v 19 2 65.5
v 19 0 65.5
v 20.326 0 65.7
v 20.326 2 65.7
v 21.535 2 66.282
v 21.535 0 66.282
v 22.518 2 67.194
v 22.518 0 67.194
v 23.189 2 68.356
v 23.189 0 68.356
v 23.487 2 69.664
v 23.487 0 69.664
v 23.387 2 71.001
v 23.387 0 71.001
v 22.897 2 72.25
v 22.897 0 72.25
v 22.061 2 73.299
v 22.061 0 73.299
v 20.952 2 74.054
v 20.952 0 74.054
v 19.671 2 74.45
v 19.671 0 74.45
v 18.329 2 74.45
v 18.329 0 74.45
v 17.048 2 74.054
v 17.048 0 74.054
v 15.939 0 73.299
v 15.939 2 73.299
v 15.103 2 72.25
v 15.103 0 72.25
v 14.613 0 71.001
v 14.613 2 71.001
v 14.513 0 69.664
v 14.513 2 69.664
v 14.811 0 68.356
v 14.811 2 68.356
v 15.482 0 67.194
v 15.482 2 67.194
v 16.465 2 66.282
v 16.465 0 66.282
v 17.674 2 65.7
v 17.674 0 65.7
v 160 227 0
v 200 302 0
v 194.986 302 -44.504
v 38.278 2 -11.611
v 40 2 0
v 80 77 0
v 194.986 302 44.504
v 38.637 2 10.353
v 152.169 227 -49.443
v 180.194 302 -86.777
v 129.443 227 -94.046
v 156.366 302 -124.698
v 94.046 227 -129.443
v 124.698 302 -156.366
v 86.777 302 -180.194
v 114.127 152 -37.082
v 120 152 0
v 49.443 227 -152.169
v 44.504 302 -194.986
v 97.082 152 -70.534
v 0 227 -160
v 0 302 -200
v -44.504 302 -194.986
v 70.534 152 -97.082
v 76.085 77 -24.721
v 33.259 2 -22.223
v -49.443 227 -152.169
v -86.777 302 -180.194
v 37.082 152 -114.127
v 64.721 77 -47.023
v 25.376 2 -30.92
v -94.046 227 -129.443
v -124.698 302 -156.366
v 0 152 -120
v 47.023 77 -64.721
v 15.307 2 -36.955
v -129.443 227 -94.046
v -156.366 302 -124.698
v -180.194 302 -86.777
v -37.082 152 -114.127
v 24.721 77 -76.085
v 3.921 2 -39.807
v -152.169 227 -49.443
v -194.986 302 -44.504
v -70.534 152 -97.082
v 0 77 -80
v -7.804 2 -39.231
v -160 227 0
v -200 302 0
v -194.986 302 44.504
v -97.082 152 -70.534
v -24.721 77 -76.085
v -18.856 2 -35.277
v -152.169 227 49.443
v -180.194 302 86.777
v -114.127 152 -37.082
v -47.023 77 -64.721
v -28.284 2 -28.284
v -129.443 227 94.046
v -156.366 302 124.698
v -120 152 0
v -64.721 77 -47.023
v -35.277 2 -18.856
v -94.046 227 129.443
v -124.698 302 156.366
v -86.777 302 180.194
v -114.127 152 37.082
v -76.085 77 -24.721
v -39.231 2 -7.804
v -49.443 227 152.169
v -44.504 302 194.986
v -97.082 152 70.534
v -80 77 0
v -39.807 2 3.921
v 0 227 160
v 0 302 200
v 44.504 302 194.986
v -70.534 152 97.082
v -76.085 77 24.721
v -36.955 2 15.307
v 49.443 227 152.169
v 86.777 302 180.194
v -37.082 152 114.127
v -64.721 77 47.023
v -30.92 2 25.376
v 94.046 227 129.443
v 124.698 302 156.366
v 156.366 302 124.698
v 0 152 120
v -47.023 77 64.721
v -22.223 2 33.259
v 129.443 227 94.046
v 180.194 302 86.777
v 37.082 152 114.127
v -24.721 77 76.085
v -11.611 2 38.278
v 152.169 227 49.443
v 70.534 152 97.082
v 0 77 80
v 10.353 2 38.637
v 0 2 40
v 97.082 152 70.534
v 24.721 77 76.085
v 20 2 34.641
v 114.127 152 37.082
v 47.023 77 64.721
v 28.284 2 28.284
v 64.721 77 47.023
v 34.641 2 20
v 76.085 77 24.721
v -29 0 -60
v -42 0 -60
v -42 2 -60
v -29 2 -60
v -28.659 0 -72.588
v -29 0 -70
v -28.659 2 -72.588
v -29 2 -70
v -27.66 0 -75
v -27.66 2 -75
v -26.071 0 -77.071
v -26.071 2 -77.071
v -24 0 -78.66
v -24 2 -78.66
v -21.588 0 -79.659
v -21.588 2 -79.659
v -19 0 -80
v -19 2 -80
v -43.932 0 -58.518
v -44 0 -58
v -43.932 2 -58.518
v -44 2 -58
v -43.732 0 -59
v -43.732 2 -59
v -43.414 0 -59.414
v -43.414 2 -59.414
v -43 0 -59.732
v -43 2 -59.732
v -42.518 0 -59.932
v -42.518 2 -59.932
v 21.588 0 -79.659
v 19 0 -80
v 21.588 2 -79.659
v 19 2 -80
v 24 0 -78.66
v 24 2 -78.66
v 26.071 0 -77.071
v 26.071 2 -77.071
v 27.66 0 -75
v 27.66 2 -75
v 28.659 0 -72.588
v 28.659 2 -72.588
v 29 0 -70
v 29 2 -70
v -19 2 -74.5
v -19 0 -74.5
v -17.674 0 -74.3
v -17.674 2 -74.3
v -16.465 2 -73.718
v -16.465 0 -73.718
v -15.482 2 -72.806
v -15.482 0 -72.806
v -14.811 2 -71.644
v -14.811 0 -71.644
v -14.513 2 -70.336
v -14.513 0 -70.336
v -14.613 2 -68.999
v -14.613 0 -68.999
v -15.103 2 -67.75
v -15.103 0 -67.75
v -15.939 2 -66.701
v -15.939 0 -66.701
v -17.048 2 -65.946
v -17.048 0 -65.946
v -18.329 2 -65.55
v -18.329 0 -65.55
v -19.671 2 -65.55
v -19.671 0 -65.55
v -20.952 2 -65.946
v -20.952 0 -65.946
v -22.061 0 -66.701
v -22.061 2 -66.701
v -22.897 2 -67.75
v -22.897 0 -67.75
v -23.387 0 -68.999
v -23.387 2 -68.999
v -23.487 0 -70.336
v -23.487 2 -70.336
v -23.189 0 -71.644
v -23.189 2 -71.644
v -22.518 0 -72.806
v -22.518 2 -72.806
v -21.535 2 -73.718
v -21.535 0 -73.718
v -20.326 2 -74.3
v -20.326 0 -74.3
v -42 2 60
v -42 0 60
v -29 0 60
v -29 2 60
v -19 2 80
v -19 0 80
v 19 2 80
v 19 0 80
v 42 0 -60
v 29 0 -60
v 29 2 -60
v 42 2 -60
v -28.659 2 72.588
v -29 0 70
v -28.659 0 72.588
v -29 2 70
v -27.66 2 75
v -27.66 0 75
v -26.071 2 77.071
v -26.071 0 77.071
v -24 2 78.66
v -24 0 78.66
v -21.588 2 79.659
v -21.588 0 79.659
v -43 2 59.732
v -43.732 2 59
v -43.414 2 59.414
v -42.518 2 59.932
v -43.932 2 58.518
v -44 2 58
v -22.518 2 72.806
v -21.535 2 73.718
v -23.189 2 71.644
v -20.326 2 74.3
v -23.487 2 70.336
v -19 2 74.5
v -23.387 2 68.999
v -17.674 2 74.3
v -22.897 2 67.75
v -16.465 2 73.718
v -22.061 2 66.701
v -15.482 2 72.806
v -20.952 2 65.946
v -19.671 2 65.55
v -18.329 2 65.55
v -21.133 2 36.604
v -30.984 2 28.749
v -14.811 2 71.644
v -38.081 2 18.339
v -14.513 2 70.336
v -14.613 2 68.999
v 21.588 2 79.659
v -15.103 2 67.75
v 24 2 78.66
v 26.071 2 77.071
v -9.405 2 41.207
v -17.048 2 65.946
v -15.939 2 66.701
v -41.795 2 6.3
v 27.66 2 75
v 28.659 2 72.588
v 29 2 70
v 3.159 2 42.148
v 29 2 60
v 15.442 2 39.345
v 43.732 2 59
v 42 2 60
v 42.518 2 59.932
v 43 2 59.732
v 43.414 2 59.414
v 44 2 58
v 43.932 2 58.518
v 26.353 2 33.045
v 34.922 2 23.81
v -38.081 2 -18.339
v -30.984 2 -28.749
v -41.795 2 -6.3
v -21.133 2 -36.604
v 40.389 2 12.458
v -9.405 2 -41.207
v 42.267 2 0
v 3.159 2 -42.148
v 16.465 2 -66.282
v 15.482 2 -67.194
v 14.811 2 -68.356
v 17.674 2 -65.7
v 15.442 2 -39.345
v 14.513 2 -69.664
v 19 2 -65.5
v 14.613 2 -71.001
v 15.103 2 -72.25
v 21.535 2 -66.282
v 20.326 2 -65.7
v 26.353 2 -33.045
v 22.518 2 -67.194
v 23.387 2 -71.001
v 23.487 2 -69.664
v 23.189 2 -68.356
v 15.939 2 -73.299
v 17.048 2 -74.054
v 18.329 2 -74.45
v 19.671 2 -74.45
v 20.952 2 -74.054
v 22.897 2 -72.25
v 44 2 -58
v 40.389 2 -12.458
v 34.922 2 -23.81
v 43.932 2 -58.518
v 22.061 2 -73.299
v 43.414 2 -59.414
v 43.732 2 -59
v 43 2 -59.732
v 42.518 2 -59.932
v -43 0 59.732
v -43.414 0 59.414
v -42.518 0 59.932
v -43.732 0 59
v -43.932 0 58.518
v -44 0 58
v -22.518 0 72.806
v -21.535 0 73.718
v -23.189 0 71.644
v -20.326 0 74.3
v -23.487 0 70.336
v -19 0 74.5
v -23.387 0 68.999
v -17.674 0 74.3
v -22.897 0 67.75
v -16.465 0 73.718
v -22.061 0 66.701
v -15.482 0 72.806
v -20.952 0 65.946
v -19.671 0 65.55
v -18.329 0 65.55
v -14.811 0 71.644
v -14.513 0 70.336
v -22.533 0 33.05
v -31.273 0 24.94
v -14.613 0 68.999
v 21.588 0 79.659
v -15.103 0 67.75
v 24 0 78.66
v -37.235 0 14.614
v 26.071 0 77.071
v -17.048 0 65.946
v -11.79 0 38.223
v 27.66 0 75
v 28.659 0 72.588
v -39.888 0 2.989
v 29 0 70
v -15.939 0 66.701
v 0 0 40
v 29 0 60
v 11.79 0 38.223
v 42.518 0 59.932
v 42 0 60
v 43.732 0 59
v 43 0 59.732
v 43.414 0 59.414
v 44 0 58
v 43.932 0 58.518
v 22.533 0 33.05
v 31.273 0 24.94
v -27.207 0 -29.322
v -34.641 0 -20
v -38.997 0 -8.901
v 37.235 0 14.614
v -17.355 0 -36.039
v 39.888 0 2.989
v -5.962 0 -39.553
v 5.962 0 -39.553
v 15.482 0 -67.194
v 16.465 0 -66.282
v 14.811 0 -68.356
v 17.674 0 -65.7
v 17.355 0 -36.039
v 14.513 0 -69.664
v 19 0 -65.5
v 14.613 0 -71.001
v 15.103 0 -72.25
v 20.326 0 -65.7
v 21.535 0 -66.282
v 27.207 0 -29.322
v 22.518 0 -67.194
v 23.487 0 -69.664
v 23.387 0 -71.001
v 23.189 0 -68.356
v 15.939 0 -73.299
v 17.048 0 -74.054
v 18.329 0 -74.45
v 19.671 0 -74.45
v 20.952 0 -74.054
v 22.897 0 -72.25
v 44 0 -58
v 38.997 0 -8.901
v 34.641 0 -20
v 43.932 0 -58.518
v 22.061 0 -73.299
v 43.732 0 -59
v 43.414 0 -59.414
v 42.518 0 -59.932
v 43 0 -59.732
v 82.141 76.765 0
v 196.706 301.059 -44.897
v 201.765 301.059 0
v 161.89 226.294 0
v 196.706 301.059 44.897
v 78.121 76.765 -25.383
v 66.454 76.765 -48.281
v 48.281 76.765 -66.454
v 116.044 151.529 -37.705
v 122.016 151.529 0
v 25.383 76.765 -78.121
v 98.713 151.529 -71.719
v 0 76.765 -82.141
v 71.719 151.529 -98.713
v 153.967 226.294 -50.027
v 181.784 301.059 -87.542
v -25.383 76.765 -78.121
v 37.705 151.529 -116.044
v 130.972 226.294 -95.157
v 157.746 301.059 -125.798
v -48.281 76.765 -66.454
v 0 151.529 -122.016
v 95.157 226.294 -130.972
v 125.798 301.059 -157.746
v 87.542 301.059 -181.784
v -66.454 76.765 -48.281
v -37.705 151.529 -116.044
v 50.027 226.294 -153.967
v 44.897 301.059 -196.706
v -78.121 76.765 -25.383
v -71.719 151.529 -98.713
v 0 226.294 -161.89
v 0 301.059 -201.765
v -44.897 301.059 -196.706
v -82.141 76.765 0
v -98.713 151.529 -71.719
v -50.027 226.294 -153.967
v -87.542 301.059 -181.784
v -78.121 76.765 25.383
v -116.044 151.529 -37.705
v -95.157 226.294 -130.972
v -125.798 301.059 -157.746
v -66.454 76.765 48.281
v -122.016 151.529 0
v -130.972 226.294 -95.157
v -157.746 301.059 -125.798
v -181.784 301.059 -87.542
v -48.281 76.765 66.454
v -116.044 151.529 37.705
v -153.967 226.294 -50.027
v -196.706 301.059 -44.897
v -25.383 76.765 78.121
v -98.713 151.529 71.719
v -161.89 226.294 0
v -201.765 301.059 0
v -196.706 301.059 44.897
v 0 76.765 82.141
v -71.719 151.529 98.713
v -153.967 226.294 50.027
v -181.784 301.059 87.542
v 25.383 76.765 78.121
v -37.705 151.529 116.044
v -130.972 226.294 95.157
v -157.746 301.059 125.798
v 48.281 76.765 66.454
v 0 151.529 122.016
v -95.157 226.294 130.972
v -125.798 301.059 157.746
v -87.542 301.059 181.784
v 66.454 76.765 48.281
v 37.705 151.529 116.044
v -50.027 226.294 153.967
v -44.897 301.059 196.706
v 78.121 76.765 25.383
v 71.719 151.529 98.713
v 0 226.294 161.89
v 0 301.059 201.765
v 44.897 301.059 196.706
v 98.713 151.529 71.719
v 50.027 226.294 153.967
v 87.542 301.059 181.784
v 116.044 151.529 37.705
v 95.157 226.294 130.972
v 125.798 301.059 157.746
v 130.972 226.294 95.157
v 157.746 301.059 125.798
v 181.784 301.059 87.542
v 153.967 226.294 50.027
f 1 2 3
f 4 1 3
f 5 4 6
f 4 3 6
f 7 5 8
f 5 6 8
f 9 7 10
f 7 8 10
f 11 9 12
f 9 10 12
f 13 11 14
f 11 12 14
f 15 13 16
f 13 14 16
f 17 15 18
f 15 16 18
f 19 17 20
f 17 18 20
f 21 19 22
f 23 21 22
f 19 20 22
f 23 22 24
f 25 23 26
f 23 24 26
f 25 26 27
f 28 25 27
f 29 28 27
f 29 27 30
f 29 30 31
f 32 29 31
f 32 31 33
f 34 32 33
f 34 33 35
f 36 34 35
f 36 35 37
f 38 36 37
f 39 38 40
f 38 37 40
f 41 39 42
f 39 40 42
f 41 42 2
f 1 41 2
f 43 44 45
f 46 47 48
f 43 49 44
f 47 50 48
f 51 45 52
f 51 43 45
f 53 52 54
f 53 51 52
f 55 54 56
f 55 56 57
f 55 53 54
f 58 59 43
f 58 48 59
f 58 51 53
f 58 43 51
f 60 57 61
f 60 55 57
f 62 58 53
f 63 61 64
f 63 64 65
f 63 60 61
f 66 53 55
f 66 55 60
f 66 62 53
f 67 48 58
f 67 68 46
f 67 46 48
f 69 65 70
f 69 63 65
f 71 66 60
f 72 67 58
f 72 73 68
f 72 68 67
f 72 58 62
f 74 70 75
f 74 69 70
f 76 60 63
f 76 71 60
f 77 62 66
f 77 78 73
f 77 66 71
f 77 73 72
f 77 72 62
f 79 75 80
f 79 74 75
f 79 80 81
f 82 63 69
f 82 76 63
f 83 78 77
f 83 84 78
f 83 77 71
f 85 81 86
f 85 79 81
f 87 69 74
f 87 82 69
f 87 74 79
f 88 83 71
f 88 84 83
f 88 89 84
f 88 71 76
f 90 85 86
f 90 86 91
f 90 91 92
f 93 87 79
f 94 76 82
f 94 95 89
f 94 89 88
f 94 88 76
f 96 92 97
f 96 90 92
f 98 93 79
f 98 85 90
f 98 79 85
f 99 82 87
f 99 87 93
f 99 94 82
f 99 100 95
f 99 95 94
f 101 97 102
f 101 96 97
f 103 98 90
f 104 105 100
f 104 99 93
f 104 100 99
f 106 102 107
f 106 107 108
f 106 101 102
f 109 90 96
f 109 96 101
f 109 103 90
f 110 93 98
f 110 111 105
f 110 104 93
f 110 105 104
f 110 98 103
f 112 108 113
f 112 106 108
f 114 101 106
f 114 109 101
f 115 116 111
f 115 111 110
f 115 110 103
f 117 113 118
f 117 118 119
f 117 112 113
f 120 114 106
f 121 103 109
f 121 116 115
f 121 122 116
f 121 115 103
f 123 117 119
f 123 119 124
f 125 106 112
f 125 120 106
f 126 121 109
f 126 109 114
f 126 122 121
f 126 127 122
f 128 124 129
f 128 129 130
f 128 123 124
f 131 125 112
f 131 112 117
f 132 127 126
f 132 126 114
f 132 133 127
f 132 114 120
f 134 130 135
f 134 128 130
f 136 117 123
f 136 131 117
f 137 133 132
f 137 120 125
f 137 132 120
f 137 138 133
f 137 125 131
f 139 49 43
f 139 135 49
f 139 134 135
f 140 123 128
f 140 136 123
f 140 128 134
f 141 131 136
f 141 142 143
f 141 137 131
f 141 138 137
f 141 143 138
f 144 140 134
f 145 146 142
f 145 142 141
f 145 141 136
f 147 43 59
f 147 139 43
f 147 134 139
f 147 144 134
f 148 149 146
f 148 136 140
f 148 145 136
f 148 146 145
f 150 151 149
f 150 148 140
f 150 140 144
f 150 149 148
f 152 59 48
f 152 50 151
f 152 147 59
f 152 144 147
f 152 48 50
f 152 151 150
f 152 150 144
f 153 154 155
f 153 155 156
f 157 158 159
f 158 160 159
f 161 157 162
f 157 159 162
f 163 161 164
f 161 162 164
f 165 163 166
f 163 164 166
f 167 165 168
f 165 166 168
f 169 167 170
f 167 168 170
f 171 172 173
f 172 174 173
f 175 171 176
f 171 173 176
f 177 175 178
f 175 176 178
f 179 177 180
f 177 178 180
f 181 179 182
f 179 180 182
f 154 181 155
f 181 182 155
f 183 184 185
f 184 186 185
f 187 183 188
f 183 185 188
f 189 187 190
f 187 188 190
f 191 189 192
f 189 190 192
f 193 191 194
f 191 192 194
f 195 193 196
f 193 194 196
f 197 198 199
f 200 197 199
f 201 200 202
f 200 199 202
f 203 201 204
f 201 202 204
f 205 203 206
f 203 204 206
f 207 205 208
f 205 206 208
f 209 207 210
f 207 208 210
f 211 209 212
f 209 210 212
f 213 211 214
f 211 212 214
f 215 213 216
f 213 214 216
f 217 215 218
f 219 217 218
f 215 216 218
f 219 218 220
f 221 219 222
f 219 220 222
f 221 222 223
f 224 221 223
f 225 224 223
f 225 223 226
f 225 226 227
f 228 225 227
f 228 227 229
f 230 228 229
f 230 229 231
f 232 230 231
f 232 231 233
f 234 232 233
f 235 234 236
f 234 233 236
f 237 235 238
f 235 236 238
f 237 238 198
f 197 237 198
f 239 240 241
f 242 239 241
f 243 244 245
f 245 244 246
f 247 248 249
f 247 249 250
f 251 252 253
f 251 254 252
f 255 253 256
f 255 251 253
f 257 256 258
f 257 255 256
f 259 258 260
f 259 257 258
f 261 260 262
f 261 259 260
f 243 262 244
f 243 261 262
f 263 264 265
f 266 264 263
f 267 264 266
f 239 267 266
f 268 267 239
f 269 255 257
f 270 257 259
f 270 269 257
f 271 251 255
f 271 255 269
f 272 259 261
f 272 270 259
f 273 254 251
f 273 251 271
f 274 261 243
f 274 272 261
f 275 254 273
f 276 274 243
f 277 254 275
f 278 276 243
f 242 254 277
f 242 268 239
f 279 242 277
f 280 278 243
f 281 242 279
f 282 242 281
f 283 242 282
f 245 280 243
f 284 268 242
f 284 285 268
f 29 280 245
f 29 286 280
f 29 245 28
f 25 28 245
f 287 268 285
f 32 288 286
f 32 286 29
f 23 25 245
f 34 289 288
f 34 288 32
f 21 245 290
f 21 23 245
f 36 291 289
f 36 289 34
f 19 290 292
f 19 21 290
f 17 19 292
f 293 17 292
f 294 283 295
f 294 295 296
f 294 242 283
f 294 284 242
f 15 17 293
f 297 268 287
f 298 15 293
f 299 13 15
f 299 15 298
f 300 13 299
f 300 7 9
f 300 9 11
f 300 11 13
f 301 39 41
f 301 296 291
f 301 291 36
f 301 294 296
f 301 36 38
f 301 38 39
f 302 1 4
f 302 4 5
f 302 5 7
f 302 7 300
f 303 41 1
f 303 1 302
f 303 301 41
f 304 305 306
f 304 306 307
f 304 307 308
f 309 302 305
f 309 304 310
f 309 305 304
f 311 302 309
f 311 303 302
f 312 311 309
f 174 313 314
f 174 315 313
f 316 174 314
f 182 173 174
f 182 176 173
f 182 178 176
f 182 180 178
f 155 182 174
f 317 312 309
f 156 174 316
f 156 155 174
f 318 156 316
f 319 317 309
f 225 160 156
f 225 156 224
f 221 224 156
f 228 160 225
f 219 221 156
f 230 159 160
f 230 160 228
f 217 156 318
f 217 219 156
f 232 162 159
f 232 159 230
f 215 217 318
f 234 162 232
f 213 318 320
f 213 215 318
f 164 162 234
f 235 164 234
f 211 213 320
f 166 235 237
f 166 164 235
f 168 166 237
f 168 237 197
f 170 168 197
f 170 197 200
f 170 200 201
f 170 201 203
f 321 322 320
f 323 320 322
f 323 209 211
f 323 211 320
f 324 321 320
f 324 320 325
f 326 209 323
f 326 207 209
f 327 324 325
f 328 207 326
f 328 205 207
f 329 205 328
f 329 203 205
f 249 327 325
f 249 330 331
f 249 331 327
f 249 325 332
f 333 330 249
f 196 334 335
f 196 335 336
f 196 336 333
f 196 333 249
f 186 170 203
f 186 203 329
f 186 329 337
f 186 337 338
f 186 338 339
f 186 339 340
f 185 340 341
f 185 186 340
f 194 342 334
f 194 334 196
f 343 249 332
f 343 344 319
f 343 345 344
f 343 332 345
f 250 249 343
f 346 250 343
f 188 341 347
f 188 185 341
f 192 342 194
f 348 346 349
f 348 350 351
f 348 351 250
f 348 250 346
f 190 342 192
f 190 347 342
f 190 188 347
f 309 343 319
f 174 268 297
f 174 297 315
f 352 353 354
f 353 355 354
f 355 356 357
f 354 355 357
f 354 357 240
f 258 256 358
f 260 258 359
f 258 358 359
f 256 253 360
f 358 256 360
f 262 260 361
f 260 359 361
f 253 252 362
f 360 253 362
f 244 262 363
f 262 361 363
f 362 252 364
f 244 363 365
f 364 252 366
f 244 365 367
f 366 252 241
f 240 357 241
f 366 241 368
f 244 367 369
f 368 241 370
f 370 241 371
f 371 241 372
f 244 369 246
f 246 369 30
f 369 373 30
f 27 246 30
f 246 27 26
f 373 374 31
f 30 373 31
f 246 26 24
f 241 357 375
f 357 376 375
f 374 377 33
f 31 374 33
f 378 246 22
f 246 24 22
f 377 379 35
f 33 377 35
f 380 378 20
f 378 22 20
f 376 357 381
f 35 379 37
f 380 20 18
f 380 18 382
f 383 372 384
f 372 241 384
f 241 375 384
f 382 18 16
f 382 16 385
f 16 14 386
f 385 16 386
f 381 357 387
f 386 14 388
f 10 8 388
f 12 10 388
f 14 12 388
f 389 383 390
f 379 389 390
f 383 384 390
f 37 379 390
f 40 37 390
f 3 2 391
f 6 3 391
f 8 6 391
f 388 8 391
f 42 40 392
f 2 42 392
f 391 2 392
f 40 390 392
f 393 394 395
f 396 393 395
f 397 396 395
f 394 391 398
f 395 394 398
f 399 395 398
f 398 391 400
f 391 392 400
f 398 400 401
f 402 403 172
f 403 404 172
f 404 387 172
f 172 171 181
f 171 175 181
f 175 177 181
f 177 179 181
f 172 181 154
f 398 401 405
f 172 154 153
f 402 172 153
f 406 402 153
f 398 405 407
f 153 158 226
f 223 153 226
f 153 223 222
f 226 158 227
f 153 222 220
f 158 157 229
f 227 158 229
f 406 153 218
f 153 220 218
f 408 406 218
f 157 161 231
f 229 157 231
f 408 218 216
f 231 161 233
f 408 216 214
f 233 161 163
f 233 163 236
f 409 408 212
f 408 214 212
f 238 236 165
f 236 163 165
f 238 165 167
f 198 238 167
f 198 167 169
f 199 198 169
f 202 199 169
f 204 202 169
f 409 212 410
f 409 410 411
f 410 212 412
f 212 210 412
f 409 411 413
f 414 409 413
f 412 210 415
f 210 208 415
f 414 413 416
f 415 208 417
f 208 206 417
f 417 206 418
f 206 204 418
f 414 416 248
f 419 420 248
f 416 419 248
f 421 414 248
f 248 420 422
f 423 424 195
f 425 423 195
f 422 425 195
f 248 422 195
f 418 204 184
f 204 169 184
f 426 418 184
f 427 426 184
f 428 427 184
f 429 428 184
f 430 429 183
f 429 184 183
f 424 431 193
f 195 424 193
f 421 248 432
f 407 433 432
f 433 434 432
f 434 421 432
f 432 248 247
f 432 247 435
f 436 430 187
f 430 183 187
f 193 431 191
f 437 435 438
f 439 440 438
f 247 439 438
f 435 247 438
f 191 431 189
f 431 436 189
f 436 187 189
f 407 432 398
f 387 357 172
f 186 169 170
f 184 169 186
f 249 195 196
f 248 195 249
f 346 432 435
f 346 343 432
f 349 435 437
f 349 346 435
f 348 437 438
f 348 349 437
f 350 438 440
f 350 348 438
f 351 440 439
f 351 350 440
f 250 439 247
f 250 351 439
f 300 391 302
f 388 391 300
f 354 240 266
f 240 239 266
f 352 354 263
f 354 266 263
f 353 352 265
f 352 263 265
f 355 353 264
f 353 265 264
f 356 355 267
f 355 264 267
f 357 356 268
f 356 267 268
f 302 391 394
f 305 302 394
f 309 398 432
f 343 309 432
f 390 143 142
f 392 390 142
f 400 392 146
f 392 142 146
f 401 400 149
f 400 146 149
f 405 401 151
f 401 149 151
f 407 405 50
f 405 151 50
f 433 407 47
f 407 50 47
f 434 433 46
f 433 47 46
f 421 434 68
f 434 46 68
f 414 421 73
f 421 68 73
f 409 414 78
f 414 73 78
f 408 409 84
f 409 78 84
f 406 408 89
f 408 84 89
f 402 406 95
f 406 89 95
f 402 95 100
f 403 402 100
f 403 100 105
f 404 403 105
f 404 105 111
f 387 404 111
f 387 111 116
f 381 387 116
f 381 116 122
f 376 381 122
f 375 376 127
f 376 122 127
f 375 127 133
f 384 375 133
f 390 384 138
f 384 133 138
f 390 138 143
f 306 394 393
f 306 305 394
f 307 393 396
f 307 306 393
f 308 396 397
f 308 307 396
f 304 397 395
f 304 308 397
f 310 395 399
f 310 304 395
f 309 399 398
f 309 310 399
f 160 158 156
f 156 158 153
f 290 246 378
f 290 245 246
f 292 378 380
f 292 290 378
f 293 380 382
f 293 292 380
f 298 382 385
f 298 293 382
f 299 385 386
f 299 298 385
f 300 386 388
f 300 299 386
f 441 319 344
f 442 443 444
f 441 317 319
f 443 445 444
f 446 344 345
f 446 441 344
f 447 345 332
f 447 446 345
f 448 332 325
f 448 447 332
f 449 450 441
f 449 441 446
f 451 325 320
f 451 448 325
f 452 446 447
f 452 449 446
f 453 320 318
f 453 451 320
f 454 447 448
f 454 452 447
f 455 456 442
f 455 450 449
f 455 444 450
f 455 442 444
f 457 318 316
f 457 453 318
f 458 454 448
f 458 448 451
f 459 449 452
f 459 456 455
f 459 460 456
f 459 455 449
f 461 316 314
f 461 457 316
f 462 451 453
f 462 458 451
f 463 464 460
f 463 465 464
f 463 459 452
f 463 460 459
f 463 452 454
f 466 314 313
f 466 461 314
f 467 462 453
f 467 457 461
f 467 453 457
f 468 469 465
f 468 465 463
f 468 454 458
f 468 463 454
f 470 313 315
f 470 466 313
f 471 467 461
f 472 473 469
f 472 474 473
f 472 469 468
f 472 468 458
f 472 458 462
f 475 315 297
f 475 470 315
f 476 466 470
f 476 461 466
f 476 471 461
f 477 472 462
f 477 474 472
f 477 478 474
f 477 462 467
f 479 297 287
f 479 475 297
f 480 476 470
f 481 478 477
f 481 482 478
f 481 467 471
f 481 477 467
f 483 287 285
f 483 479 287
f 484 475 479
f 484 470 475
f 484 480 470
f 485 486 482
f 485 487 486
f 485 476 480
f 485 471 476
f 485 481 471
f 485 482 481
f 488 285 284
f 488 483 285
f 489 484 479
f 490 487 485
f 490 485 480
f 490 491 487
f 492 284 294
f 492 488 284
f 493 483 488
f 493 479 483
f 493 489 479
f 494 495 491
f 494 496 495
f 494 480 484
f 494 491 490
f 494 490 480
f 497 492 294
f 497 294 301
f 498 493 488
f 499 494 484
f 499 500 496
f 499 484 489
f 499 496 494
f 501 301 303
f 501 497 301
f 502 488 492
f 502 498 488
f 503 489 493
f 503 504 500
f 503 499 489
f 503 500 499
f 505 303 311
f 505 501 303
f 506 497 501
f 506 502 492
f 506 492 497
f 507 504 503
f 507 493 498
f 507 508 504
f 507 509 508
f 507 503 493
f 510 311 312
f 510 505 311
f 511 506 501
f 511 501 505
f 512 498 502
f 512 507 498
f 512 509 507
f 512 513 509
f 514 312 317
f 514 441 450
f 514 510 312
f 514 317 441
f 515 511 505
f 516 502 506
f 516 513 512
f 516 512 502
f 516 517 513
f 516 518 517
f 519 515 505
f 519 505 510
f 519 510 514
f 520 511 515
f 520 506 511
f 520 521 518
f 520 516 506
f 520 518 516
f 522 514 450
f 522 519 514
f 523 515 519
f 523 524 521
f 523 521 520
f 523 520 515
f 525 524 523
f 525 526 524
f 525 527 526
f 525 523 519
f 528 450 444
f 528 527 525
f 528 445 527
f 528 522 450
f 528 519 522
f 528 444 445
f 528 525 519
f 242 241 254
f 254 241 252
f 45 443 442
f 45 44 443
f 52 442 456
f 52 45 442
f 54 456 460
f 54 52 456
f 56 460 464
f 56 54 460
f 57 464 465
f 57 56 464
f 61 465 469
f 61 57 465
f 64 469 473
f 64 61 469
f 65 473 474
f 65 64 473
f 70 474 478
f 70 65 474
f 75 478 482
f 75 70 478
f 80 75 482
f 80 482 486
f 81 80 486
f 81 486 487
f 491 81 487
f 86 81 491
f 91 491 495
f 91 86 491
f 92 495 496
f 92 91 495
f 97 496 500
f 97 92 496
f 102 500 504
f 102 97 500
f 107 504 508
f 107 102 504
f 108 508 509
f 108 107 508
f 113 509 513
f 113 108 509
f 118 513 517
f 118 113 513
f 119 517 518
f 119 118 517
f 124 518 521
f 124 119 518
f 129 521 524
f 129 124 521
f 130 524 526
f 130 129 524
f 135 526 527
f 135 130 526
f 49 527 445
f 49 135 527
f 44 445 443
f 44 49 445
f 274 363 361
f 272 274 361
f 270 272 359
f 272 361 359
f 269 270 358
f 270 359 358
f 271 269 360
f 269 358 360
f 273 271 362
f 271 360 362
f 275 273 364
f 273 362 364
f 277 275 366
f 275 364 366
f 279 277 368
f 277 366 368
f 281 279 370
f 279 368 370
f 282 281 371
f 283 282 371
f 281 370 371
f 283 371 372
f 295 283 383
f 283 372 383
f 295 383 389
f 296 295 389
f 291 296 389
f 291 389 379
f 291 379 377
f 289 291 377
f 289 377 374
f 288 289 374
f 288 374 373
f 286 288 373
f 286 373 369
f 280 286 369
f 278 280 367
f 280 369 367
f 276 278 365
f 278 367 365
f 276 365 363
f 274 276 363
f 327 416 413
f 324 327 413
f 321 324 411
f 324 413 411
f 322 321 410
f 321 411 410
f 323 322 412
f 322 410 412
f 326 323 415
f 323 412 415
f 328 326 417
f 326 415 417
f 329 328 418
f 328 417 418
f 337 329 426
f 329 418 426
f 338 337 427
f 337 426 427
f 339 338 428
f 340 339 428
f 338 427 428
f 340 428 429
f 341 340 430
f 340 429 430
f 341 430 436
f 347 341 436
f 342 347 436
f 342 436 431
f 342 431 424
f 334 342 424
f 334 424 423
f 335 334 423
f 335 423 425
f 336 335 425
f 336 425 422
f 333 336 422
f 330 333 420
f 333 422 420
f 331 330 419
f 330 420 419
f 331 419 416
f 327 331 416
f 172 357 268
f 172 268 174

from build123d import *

# Parameters (mm, degrees)
SKETCH1_W           = 88
SKETCH1_H           = 120
BOSS_EXTRUDE1_DEPTH = 2
SKETCH2_R           = 40
CUT_EXTRUDE1_DEPTH  = 2
SKETCH4_W           = 58
SKETCH4_H           = 20
SKETCH4_R           = 4.5
BOSS_EXTRUDE2_DEPTH = 2
FILLET1_R           = 10
FILLET2_R           = 2


# Read off the part's stored shape, not the designer's step: Thicken1
with BuildPart() as part:
    # Sketch1 → Boss-Extrude1 (new body)
    with BuildSketch(Plane(origin=(0, 0, 0), x_dir=(1, 0, 0), z_dir=(0, 1, 0))):
        Rectangle(SKETCH1_W, SKETCH1_H)
    extrude(amount=BOSS_EXTRUDE1_DEPTH)

    # Sketch2 → Cut-Extrude1 (cut)
    with BuildSketch(Plane(origin=(0, 2, 0), x_dir=(1, 0, 0), z_dir=(0, 1, 0))):
        with Locations(Location((0, 0, 0), (0, 0, 270))):
            Circle(SKETCH2_R)
    extrude(amount=-CUT_EXTRUDE1_DEPTH, mode=Mode.SUBTRACT)

    # Thicken1 outline → Thicken1 (revolve)
    with BuildSketch(Plane.XY):
        Polygon((201.764705882, 301.058823529), (200, 302), (40, 2), (42.266666667, 2), align=None)
    revolve(axis=Axis((0, 0, 0), (0, 1, 0)))

    # Sketch4 → Boss-Extrude2 (add)
    # profile 1 of 2: a face of its own
    with BuildSketch(Plane.XZ):
        with Locations((0, 70)):
            Rectangle(SKETCH4_W, SKETCH4_H)
        with Locations(Location((19, 70, 0), (0, 0, 270))):
            Circle(SKETCH4_R, mode=Mode.SUBTRACT)
        with Locations(Location((-19, 70, 0), (0, 0, 90))):
            Circle(SKETCH4_R, mode=Mode.SUBTRACT)
    # profile 2 of 2: a face of its own
    with BuildSketch(Plane.XZ):
        with Locations((0, -70)):
            Rectangle(SKETCH4_W, SKETCH4_H)
        with Locations(Location((-19, -70, 0), (0, 0, 270))):
            Circle(SKETCH4_R, mode=Mode.SUBTRACT)
        with Locations(Location((19, -70, 0), (0, 0, 90))):
            Circle(SKETCH4_R, mode=Mode.SUBTRACT)
    extrude(amount=-BOSS_EXTRUDE2_DEPTH)

    # Fillet1
    fillet1_edges = [part.edges().sort_by_distance(p)[0] for p in [
        (-29, 1, 80),
        (29, 1, 80),
        (29, 1, -80),
        (-29, 1, -80),
    ]]
    fillet(fillet1_edges, radius=FILLET1_R)

    # Fillet2
    fillet2_edges = [part.edges().sort_by_distance(p)[0] for p in [
        (44, 1, 60),
        (-44, 1, 60),
        (-44, 1, -60),
        (44, 1, -60),
    ]]
    fillet(fillet2_edges, radius=FILLET2_R)


solid = part.part
